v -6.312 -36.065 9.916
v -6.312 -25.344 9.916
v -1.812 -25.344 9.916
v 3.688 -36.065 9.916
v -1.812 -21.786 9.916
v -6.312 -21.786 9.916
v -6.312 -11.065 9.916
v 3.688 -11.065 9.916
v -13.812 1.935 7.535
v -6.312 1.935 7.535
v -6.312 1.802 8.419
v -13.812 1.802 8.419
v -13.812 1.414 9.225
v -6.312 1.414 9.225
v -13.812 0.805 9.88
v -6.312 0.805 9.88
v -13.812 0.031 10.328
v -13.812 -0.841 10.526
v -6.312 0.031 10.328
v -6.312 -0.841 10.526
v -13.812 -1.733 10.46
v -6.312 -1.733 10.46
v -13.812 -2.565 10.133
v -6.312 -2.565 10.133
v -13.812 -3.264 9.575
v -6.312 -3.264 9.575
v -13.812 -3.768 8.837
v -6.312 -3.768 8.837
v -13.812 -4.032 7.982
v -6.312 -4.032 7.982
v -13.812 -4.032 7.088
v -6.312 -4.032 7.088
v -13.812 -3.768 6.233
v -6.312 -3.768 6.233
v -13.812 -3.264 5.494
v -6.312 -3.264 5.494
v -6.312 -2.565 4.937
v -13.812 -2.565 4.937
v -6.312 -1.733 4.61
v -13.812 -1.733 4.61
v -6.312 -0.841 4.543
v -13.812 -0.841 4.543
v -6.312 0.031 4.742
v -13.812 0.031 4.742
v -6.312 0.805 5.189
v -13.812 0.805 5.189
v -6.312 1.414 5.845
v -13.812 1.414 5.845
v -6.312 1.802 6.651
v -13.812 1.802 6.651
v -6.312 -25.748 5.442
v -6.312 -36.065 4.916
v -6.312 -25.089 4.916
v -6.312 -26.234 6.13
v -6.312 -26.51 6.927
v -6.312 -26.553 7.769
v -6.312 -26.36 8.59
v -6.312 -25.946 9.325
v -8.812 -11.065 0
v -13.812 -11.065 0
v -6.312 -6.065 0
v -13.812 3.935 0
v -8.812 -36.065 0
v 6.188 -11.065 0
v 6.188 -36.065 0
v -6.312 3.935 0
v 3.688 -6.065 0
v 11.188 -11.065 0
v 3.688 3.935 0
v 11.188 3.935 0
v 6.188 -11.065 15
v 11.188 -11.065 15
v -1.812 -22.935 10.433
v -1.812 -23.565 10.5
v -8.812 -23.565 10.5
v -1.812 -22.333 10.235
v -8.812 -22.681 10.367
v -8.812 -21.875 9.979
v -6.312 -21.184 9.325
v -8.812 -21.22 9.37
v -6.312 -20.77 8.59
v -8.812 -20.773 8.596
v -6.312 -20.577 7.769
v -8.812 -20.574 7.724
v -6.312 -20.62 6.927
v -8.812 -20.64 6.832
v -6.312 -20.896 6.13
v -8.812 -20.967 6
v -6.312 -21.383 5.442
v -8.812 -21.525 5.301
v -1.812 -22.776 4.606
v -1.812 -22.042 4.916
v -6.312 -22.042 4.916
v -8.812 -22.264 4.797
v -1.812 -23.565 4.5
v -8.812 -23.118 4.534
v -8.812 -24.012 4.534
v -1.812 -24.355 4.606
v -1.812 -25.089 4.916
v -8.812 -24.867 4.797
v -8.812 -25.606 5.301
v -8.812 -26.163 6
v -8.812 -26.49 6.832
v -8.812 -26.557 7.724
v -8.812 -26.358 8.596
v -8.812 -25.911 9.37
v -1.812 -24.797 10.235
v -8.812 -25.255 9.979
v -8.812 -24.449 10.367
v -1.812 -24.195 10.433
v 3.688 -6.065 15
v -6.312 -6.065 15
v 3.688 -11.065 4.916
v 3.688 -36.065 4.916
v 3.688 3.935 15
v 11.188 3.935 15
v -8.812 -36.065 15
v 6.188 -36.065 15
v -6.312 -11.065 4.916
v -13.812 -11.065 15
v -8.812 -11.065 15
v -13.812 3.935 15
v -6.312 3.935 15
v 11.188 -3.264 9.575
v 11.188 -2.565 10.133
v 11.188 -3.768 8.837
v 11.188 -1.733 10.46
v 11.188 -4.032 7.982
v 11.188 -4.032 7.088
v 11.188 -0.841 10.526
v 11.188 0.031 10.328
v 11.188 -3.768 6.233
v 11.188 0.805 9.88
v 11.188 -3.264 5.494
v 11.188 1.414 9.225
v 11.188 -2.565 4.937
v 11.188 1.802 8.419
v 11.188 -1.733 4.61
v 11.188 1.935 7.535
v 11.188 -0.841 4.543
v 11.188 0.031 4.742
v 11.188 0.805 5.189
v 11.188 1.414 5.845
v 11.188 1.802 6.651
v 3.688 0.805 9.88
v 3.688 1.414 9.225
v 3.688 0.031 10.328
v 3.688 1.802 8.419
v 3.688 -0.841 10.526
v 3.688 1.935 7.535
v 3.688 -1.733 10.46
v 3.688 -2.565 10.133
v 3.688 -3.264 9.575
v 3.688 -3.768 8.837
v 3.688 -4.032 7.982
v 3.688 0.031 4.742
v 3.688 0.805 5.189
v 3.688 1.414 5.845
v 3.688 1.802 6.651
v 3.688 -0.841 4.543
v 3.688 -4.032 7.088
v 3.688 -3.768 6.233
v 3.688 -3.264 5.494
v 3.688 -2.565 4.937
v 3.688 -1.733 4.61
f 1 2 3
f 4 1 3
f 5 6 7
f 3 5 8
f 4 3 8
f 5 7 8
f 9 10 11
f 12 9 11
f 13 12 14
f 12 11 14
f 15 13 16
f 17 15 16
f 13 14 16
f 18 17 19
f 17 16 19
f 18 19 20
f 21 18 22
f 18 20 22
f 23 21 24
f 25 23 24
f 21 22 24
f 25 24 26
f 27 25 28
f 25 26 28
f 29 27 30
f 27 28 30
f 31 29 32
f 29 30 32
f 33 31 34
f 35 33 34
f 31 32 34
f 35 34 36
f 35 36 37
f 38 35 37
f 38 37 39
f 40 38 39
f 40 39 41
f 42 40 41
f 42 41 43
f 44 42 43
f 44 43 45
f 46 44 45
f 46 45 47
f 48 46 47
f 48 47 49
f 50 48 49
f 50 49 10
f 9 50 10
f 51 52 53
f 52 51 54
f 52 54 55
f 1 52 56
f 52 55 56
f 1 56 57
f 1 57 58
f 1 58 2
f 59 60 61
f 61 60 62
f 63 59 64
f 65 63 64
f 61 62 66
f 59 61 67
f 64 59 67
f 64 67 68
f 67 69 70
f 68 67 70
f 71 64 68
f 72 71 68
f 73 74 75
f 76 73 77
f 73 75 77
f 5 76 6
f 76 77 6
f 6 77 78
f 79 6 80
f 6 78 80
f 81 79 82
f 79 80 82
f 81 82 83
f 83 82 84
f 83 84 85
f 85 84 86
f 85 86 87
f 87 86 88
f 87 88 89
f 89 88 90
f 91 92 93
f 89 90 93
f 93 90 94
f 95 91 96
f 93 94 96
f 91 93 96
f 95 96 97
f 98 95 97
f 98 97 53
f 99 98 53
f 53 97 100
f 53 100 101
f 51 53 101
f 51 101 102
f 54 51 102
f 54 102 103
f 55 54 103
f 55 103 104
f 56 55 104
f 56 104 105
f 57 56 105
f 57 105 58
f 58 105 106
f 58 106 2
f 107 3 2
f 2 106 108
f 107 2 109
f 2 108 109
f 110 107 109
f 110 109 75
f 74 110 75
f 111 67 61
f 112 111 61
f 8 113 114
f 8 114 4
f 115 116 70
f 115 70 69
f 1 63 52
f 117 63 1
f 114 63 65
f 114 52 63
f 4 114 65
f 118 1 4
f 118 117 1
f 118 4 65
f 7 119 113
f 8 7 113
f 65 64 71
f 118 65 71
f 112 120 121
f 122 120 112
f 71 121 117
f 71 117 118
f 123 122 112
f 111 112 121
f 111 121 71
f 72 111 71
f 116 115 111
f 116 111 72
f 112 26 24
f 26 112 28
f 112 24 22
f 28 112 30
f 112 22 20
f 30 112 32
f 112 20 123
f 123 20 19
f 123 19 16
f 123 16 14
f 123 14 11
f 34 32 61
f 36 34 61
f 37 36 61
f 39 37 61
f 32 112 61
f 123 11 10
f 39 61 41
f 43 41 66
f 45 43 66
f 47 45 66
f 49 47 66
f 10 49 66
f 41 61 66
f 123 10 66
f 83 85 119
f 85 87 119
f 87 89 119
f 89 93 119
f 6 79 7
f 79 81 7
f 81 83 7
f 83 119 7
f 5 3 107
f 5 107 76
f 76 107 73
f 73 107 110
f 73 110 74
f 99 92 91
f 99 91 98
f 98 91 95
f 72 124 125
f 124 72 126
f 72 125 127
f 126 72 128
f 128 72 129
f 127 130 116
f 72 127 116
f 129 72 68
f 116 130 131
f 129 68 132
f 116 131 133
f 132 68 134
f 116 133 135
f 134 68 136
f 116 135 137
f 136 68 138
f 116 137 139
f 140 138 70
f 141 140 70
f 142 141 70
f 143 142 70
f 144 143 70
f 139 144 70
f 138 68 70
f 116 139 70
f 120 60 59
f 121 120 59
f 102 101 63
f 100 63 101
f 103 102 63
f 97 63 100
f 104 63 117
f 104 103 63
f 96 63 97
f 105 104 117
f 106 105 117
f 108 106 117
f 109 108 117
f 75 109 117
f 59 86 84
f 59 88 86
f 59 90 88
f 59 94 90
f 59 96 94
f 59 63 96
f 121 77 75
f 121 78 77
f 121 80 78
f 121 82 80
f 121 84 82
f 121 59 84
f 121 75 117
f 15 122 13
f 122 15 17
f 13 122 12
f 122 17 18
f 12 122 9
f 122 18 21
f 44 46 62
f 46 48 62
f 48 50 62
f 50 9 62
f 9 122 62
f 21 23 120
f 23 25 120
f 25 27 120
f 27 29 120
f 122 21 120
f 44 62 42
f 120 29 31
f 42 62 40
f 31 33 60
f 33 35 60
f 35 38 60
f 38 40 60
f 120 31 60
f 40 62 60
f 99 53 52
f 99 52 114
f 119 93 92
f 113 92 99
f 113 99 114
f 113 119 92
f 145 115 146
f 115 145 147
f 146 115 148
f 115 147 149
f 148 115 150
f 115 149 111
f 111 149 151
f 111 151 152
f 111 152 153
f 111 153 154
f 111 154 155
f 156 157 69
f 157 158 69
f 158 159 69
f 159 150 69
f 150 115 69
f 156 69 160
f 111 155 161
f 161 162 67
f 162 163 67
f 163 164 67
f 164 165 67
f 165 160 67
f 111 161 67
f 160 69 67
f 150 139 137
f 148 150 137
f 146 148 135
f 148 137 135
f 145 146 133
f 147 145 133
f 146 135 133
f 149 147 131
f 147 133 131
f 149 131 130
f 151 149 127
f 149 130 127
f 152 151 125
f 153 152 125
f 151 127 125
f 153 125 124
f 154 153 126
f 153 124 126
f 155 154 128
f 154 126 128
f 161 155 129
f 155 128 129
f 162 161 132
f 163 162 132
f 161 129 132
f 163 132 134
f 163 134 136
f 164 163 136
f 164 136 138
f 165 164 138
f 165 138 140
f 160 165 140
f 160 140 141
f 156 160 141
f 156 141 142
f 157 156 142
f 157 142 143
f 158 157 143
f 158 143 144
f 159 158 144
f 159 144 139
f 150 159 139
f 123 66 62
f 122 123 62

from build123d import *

# Parameters (mm, degrees)
BOSS_EXTRUDE1_DEPTH = 15
SKETCH2_R           = 3
CUT_EXTRUDE1_DEPTH  = 35
SKETCH3_W           = 15
SKETCH3_H           = 15
SKETCH3_W_2         = 10
SKETCH3_H_2         = 5
BOSS_EXTRUDE2_DEPTH = 25
SKETCH5_R           = 3
CUT_EXTRUDE3_DEPTH  = 7


with BuildPart() as part:
    # Sketch1 → Boss-Extrude1 (new body)
    with BuildSketch(Plane.XY):
        Polygon((3.687581296, 3.934802907), (3.687581296, -6.065197093), (-6.312418704, -6.065197093), (-6.312418704, 3.934802907), (-13.812418704, 3.934802907), (-13.812418704, -11.065197093), (11.187581296, -11.065197093), (11.187581296, 3.934802907), align=None)
    extrude(amount=BOSS_EXTRUDE1_DEPTH)

    # Sketch2 → Cut-Extrude1 (cut)
    with BuildSketch(Plane(origin=(11.187581296, 0, 0), x_dir=(0, 0, -1), z_dir=(1, 0, 0))):
        with Locations(Location((-7.534884308, -1.065197093, 0), (0, 0, 90))):
            Circle(SKETCH2_R)
    extrude(amount=-CUT_EXTRUDE1_DEPTH, mode=Mode.SUBTRACT)

    # Sketch3 → Boss-Extrude2 (add)
    with BuildSketch(Plane.XZ.offset(11.065197093)):
        with Locations((-1.312418704, 7.5)):
            Rectangle(SKETCH3_W, SKETCH3_H)
        with Locations((-1.312418704, 7.415567581)):
            Rectangle(SKETCH3_W_2, SKETCH3_H_2, mode=Mode.SUBTRACT)
    extrude(amount=BOSS_EXTRUDE2_DEPTH)

    # Sketch5 → Cut-Extrude3 (cut)
    with BuildSketch(Plane.ZY.offset(8.812418704)):
        with Locations((7.5, -23.565197093)):
            Circle(SKETCH5_R)
    extrude(amount=-CUT_EXTRUDE3_DEPTH, mode=Mode.SUBTRACT)


solid = part.part
